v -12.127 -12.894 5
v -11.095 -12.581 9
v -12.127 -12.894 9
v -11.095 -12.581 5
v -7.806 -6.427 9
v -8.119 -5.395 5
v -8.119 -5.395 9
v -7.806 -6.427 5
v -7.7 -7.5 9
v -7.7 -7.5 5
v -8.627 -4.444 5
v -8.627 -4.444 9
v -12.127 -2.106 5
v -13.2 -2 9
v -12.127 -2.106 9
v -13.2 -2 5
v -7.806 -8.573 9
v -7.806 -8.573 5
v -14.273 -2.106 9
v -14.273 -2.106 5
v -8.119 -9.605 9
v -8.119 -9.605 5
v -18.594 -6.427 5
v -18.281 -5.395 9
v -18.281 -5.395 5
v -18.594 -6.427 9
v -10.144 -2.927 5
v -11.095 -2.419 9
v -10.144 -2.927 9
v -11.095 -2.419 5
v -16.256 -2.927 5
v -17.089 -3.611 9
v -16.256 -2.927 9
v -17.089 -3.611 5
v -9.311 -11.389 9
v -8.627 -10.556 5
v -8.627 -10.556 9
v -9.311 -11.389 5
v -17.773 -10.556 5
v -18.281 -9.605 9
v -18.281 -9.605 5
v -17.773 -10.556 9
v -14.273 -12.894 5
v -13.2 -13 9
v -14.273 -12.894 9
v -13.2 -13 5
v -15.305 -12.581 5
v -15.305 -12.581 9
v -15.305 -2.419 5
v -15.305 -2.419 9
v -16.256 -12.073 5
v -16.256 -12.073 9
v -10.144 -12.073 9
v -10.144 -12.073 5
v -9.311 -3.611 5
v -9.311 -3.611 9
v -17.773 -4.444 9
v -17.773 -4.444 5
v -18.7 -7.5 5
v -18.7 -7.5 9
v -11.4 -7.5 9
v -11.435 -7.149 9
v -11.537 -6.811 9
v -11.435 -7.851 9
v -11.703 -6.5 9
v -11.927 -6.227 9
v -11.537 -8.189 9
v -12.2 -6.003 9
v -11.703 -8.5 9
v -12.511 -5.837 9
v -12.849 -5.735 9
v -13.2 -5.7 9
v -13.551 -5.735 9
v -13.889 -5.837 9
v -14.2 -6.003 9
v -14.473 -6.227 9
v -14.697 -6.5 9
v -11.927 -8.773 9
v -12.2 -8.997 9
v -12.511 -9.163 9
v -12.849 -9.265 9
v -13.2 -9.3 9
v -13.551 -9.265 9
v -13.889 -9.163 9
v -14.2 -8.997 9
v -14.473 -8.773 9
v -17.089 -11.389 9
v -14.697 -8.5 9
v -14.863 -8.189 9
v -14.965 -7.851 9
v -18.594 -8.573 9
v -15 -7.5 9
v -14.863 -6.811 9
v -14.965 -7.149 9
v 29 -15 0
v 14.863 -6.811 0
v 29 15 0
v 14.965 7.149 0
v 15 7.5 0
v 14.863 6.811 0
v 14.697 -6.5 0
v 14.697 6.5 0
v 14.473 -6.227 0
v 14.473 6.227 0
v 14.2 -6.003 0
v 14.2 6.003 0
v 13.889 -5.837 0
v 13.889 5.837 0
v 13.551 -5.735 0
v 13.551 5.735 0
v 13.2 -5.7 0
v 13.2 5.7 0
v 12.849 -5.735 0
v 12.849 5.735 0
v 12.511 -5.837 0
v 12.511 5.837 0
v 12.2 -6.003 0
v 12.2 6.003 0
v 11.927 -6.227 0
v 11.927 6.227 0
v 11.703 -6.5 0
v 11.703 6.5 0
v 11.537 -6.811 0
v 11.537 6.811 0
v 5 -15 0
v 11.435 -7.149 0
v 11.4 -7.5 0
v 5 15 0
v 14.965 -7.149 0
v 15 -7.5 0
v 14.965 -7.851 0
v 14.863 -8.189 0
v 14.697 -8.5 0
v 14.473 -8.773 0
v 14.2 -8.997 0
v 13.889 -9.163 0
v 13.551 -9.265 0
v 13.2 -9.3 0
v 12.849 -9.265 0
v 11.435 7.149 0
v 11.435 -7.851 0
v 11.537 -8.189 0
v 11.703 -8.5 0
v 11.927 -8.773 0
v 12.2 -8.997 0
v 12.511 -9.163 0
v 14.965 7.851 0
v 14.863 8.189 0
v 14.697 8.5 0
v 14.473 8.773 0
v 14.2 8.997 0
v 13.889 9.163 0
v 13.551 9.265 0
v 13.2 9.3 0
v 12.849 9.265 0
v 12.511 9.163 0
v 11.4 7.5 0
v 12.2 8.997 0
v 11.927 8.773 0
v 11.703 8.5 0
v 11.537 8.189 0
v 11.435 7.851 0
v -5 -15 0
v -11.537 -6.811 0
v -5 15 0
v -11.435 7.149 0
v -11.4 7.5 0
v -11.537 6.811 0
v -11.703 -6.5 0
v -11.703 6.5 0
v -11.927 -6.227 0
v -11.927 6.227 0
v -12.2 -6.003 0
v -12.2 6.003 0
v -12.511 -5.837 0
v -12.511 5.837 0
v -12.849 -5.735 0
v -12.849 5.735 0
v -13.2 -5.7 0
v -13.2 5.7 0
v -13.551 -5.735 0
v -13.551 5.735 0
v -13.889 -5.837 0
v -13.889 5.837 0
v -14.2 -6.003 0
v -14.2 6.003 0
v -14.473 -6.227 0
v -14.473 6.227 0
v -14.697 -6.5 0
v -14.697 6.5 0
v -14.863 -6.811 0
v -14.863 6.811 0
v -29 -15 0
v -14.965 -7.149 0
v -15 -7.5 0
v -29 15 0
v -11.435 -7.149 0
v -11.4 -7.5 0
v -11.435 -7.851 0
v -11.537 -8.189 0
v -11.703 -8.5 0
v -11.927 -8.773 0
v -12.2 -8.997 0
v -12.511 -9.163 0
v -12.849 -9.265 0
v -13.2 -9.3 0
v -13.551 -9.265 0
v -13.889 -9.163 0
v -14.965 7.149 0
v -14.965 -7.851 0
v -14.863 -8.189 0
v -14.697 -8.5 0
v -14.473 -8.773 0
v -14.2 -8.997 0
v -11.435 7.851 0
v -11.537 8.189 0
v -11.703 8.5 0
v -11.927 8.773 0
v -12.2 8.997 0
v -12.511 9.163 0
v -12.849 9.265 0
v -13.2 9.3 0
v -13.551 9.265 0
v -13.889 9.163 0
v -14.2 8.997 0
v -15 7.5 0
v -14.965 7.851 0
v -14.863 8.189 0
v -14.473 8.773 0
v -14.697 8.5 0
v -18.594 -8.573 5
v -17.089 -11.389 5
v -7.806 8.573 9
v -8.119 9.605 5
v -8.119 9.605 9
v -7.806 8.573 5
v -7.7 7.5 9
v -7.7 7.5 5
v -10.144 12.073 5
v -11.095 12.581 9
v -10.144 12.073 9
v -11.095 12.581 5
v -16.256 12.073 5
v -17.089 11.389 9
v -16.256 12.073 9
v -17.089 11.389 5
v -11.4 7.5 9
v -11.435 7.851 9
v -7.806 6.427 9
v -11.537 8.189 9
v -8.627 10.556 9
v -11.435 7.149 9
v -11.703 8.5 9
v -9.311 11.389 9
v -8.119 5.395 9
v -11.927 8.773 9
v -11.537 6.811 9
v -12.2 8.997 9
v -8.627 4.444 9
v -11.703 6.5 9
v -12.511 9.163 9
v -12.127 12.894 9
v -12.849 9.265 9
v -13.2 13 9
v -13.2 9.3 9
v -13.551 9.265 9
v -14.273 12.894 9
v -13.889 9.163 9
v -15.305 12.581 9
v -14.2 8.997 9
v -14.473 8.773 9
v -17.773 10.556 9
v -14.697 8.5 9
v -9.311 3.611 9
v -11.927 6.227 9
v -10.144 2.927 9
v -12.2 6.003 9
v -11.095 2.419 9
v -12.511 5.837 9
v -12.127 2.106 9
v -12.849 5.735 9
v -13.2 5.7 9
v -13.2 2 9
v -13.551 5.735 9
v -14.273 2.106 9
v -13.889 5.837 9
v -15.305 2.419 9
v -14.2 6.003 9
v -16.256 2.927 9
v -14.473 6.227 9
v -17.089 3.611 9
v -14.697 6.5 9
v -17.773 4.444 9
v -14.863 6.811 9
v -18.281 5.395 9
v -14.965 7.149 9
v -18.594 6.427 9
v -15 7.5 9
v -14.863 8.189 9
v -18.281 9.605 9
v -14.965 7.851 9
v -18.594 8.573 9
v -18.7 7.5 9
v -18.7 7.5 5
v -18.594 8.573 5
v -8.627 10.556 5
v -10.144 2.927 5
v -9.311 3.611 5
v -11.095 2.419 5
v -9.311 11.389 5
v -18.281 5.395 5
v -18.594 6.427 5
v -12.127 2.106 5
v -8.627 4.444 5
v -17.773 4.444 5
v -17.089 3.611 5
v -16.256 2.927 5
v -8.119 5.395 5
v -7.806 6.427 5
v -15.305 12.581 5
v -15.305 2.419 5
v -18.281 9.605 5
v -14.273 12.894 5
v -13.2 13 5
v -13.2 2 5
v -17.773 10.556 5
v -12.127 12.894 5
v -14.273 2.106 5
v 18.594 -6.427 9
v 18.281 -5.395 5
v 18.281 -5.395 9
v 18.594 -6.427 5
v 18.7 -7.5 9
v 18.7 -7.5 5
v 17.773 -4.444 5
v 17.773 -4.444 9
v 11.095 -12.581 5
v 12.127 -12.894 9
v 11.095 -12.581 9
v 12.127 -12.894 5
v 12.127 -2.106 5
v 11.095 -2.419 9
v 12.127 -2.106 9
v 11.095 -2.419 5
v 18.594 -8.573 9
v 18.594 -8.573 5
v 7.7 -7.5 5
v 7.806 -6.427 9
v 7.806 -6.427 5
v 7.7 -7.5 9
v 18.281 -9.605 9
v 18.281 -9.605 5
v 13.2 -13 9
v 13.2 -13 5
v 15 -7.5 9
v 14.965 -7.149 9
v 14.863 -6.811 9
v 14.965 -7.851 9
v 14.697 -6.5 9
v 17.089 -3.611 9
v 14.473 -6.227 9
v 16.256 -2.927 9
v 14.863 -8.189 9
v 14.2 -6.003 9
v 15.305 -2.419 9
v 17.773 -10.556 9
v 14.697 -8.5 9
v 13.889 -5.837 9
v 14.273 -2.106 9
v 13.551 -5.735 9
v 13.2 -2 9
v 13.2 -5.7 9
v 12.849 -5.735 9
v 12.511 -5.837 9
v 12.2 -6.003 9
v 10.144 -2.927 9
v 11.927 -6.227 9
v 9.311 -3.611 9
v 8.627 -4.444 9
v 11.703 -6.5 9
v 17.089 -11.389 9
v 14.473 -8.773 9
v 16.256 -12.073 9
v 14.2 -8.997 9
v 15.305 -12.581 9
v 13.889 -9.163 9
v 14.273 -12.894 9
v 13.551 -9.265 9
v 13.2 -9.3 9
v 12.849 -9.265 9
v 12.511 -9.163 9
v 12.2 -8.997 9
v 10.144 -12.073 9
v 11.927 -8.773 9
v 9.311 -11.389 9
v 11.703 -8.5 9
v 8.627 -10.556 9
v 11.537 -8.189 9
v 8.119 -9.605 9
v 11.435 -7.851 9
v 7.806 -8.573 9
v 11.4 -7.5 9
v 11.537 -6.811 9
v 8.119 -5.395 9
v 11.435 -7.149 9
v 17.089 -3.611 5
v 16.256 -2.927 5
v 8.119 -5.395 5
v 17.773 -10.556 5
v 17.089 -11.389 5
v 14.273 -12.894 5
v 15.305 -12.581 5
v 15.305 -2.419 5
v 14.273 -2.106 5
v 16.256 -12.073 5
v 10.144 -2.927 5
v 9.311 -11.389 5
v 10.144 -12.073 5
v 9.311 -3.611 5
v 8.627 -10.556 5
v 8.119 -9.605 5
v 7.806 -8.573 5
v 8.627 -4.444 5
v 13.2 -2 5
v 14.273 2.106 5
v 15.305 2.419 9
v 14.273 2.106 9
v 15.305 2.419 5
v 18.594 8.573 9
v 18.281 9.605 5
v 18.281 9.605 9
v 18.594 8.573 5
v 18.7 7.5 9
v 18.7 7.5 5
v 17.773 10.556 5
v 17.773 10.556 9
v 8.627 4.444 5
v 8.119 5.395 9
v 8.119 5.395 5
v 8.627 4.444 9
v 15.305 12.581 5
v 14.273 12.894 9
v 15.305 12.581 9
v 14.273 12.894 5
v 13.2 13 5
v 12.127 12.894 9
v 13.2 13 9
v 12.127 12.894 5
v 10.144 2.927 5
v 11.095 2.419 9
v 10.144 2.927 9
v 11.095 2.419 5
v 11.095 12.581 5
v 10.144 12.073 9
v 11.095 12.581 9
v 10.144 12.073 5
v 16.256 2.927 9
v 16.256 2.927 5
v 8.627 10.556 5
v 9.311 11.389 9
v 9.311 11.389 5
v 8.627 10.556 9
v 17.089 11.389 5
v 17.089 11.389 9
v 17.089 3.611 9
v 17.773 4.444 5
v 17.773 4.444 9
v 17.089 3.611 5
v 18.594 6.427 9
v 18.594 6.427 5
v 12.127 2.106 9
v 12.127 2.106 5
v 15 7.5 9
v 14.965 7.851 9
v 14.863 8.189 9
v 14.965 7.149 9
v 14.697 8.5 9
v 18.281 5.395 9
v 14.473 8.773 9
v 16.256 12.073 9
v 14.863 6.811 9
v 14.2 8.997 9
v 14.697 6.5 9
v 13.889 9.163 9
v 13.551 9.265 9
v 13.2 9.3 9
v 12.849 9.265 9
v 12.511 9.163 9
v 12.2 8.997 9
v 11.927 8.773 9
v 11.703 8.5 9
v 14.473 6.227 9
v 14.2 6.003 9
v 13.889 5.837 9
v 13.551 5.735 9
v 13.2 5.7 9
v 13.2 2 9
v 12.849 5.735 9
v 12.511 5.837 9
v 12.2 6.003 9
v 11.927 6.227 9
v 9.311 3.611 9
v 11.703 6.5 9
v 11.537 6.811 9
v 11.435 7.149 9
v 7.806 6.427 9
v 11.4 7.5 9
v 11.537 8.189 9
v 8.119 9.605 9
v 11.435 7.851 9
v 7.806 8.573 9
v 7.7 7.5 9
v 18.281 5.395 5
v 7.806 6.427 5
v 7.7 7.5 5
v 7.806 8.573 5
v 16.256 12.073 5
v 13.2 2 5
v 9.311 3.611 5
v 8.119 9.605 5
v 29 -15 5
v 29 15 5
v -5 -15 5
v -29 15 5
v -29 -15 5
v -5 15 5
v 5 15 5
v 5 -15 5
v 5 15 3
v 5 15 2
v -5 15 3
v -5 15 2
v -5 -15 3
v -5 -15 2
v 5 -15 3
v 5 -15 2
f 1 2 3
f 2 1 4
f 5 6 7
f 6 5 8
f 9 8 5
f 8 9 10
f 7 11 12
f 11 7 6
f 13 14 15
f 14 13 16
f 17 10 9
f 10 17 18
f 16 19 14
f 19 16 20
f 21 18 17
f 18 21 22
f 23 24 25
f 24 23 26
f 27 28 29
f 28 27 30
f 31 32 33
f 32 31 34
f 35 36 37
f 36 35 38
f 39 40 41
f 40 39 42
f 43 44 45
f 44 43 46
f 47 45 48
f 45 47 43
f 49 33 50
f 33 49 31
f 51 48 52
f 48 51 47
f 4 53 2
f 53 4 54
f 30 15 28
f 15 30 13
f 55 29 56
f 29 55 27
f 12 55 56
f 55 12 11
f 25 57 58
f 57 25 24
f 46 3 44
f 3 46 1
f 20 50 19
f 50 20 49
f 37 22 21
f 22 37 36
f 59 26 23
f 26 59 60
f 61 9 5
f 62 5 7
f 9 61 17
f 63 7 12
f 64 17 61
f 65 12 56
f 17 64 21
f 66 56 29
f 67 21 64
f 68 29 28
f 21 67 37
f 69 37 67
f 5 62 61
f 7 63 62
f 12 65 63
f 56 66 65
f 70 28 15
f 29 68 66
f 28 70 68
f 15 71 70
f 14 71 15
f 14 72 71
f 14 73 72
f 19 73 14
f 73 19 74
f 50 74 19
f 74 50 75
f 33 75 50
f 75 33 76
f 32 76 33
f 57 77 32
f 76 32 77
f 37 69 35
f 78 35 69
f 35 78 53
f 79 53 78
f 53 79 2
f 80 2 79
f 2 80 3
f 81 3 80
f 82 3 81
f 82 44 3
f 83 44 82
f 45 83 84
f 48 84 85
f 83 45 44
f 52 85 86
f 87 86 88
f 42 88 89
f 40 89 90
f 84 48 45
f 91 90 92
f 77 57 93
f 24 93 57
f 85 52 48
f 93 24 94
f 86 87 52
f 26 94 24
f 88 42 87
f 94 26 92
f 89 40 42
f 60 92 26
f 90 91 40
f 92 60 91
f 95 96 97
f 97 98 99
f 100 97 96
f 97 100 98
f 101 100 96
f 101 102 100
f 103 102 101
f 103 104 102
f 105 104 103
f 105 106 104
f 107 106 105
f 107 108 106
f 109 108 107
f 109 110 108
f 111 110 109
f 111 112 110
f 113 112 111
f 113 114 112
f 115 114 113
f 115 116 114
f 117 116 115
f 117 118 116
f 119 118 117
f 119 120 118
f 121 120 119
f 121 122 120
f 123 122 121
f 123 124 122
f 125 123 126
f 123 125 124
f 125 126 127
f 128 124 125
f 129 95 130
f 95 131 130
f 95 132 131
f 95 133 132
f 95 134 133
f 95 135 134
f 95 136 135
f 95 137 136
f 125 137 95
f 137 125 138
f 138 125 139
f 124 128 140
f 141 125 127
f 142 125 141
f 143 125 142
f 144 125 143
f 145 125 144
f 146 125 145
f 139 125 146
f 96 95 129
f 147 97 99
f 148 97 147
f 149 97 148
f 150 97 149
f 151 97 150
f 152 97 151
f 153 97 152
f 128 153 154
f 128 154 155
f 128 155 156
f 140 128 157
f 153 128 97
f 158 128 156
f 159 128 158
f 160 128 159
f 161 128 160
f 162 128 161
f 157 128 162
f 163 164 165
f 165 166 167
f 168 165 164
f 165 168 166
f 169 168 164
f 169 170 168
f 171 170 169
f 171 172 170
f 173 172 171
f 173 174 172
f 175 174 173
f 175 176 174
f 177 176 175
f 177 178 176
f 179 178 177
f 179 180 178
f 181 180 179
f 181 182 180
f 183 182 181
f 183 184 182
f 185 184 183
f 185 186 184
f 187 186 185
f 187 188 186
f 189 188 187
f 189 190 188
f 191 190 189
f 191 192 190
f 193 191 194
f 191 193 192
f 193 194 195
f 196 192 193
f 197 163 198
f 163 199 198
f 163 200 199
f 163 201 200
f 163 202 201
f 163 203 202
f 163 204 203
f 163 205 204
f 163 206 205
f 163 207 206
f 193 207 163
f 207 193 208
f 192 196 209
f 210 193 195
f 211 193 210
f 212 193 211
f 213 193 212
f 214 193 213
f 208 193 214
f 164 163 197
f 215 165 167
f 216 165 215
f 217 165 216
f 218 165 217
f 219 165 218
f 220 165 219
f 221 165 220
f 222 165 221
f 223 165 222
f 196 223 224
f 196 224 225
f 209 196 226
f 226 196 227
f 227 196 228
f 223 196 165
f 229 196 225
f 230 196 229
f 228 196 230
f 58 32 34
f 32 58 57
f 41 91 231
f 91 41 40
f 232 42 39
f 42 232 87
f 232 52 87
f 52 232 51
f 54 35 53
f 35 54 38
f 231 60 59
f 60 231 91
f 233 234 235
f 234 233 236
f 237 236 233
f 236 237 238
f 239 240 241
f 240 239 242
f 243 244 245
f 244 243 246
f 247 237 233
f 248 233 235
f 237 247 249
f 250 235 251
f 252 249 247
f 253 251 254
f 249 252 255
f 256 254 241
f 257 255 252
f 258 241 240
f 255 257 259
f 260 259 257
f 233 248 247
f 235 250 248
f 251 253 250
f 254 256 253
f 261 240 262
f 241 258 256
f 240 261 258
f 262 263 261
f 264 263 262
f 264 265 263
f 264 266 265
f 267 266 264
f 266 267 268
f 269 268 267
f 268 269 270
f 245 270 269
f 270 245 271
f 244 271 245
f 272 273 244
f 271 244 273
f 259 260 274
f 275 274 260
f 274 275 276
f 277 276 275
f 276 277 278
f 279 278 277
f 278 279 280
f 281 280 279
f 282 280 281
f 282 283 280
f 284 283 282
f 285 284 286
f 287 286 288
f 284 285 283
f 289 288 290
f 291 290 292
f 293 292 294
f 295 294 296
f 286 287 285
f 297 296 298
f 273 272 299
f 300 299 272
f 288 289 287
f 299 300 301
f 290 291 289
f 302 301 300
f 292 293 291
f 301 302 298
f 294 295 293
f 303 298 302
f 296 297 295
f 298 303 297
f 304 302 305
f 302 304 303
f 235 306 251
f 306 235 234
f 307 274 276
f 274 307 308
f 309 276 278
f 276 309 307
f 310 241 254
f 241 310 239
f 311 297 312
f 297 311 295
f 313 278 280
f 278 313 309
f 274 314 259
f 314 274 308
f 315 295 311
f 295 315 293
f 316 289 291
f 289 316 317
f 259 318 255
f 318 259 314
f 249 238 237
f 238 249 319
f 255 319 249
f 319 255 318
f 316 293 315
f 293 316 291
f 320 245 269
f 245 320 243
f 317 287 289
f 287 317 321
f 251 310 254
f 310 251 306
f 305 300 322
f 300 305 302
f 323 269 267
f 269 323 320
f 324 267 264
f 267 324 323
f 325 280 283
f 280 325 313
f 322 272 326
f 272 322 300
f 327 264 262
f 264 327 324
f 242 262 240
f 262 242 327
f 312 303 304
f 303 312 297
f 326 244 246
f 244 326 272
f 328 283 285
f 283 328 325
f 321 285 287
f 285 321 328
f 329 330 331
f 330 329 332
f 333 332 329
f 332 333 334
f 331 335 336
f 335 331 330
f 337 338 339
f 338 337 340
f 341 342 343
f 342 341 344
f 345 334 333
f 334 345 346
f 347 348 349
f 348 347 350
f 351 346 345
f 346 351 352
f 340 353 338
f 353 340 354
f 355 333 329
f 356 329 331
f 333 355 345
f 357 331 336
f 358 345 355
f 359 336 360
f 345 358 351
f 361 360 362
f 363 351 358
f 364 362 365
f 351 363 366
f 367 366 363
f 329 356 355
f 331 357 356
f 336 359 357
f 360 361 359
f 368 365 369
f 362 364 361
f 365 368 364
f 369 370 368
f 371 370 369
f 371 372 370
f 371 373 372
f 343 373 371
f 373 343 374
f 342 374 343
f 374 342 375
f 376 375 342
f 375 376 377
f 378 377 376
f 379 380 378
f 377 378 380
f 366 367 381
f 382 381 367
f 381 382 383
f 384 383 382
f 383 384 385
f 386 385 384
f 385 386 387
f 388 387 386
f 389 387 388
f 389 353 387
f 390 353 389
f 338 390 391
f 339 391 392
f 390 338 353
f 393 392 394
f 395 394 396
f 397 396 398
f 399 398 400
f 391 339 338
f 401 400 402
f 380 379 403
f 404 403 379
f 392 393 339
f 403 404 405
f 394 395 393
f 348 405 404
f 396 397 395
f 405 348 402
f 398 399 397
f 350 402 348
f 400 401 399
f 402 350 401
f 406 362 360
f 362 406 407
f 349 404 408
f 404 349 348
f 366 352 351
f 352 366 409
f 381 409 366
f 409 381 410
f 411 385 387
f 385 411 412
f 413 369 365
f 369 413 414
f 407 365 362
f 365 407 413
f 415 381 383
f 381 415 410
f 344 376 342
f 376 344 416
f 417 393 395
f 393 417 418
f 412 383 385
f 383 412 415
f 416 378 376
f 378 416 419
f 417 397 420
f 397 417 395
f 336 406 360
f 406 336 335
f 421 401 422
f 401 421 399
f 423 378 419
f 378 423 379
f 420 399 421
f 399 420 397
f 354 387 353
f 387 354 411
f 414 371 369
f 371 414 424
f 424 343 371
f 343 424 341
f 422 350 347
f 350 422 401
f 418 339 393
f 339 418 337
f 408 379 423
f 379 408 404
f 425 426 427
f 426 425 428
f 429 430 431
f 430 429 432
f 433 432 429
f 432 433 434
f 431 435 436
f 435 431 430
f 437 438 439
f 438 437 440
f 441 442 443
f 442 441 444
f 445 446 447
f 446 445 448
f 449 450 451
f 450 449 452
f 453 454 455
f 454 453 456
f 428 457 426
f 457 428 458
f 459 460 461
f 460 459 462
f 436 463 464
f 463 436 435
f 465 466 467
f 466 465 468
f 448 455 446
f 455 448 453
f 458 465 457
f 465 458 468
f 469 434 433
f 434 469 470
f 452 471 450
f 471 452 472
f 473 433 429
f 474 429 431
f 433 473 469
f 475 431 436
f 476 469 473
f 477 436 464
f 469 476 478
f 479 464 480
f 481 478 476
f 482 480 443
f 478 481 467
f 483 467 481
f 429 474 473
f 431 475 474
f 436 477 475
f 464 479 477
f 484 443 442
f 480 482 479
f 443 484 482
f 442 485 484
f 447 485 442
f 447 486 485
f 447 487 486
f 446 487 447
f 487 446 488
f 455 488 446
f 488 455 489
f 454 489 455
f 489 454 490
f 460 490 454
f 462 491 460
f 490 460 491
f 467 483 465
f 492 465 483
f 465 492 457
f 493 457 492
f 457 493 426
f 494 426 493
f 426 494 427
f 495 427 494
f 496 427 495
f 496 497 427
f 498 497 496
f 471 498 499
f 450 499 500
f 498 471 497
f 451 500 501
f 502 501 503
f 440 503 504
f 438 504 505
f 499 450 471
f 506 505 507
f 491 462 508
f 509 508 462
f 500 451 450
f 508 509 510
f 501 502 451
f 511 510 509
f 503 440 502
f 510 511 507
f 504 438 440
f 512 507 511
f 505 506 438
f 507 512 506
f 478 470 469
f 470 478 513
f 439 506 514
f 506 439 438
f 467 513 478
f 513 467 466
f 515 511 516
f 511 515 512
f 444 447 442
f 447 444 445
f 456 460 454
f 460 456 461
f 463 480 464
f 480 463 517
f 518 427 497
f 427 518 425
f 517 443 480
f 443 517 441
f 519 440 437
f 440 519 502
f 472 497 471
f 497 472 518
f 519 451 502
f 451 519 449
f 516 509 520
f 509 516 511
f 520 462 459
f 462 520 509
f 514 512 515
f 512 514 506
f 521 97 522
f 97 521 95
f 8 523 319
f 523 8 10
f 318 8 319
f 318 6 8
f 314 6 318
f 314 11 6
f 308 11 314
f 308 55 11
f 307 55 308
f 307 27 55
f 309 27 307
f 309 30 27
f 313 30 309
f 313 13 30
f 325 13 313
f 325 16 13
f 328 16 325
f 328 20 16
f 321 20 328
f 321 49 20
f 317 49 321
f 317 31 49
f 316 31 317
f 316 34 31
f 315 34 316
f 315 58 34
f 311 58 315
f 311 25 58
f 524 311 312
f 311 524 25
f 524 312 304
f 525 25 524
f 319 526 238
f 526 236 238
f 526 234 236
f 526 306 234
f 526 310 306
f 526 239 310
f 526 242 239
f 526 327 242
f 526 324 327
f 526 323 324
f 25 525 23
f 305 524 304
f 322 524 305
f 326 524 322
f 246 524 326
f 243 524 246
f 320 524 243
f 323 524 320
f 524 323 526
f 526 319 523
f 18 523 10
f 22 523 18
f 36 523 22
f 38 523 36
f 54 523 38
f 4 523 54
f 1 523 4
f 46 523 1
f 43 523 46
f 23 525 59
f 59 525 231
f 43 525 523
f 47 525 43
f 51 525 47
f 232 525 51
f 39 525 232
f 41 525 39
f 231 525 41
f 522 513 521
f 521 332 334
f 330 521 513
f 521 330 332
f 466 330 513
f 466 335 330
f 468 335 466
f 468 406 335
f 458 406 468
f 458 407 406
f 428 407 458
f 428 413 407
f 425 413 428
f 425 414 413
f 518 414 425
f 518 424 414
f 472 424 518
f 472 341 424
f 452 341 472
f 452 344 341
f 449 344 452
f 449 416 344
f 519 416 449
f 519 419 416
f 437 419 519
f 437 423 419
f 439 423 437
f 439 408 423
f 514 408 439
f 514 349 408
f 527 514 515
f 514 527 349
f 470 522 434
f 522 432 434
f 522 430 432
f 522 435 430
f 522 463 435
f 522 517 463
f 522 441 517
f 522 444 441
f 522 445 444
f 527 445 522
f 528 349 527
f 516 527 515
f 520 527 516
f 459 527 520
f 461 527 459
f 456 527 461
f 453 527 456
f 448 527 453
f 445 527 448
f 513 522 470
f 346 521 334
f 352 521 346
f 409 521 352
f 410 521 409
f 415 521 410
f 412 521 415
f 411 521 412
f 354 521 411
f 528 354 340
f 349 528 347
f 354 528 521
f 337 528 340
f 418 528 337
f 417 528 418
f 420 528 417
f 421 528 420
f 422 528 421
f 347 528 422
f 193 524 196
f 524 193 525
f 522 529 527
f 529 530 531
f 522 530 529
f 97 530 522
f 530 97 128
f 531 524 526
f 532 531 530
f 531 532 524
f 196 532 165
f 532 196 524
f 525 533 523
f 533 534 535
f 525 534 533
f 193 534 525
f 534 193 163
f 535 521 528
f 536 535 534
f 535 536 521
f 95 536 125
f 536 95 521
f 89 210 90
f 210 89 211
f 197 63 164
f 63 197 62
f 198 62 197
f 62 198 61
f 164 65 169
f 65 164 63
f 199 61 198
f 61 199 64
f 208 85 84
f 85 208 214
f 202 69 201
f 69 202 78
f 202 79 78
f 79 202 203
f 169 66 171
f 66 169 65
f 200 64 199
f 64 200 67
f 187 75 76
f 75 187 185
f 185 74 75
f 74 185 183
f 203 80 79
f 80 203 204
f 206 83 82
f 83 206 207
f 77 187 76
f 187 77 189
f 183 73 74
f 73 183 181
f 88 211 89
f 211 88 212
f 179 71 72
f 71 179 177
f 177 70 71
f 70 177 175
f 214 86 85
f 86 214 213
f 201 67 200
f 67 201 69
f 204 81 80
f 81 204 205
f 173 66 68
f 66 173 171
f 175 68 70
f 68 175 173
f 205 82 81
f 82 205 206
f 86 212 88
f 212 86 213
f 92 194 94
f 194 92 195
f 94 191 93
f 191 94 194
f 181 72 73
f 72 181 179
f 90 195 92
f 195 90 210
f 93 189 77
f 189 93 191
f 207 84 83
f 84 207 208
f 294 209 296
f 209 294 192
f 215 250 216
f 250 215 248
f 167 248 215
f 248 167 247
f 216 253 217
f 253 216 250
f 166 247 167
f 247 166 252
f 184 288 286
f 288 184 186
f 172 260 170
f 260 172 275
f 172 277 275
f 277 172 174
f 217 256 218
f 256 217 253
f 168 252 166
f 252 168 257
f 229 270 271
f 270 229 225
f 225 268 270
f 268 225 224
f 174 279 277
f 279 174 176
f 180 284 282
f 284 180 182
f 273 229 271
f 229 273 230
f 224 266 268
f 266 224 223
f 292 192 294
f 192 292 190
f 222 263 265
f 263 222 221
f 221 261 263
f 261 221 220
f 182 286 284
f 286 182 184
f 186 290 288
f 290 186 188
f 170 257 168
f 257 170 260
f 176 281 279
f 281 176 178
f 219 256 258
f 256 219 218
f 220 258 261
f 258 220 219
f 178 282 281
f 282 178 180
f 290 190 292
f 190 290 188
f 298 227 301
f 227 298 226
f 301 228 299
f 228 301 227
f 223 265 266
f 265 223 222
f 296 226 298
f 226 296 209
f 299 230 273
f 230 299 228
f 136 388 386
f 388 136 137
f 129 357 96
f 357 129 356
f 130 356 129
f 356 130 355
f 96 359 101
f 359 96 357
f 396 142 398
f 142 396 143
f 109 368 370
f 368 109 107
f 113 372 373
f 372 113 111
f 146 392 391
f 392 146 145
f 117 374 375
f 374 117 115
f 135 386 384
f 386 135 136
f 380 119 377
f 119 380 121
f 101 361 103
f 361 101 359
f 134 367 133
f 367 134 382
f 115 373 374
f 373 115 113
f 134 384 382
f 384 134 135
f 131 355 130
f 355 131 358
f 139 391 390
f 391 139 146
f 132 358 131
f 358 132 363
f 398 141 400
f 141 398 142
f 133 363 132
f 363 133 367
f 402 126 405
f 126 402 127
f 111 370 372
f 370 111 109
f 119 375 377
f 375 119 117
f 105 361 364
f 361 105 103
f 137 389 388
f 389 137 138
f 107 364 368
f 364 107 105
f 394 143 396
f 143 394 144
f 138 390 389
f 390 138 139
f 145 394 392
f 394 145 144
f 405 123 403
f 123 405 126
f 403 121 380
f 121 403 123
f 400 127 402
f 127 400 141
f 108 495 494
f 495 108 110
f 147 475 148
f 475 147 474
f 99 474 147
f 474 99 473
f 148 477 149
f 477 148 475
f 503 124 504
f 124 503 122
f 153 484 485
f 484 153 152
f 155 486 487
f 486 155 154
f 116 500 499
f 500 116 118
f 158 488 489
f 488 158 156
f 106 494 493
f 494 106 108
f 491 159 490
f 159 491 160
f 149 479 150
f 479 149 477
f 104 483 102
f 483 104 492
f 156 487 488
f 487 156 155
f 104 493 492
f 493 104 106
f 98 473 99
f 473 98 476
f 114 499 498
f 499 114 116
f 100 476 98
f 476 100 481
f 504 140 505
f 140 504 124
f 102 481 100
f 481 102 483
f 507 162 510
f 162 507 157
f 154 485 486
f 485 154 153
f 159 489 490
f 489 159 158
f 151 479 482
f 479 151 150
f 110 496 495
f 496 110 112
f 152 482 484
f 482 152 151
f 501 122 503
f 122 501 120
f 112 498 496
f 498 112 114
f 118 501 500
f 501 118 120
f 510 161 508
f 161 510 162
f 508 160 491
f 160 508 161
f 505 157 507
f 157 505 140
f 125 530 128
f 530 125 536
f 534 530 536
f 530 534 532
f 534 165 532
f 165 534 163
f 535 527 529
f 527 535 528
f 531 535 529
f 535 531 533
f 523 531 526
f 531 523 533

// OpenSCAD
$fn = 32;

// ----------------------------------------------------------------------
// Living hinge: 58 x 30 mm plates, 1 mm flexible web
// ----------------------------------------------------------------------

// --- parameters (mm) ---
plate_len = 24;           // plate length outside the web
plate_w = 30;             // plate width
thick = 5;                // plate thickness
web_half = 5;             // half width of the flex band
web_t = 1;                // flexible web thickness
web_z = 2;                // web position inside the thickness
boss_d = 11;              // screw boss diameter
boss_h = 9;               // screw boss height
boss_x = 13.2;            // screw boss distance from the web
screw_d = 3.6;            // screw hole

difference() {
  union() {
    /* one flat strip, later thinned at the middle */
    translate([-29, -15, 0]) cube([58, 30, 5]);
    /* screw bosses, sunk 0.5 mm into the plates */
    for (sx = [-13.2, 13.2]) {
      for (sy = [-7.5, 7.5]) {
        translate([sx, sy, 0]) cylinder(h = boss_h, d = boss_d);
      }
    }
  }
  /* channel from below: leaves the web on top of it */
  translate([-5, -17.5, -2.5]) cube([10, 35, 4.5]);
  /* channel from above: thins the web down to web_t */
  translate([-5, -17.5, 3]) cube([10, 35, 4.5]);
  /* screw holes through the bosses */
  for (sx = [-13.2, 13.2]) {
    for (sy = [-7.5, 7.5]) {
      translate([sx, sy, -2.5]) cylinder(h = boss_h + 5, d = screw_d);
    }
  }
}
